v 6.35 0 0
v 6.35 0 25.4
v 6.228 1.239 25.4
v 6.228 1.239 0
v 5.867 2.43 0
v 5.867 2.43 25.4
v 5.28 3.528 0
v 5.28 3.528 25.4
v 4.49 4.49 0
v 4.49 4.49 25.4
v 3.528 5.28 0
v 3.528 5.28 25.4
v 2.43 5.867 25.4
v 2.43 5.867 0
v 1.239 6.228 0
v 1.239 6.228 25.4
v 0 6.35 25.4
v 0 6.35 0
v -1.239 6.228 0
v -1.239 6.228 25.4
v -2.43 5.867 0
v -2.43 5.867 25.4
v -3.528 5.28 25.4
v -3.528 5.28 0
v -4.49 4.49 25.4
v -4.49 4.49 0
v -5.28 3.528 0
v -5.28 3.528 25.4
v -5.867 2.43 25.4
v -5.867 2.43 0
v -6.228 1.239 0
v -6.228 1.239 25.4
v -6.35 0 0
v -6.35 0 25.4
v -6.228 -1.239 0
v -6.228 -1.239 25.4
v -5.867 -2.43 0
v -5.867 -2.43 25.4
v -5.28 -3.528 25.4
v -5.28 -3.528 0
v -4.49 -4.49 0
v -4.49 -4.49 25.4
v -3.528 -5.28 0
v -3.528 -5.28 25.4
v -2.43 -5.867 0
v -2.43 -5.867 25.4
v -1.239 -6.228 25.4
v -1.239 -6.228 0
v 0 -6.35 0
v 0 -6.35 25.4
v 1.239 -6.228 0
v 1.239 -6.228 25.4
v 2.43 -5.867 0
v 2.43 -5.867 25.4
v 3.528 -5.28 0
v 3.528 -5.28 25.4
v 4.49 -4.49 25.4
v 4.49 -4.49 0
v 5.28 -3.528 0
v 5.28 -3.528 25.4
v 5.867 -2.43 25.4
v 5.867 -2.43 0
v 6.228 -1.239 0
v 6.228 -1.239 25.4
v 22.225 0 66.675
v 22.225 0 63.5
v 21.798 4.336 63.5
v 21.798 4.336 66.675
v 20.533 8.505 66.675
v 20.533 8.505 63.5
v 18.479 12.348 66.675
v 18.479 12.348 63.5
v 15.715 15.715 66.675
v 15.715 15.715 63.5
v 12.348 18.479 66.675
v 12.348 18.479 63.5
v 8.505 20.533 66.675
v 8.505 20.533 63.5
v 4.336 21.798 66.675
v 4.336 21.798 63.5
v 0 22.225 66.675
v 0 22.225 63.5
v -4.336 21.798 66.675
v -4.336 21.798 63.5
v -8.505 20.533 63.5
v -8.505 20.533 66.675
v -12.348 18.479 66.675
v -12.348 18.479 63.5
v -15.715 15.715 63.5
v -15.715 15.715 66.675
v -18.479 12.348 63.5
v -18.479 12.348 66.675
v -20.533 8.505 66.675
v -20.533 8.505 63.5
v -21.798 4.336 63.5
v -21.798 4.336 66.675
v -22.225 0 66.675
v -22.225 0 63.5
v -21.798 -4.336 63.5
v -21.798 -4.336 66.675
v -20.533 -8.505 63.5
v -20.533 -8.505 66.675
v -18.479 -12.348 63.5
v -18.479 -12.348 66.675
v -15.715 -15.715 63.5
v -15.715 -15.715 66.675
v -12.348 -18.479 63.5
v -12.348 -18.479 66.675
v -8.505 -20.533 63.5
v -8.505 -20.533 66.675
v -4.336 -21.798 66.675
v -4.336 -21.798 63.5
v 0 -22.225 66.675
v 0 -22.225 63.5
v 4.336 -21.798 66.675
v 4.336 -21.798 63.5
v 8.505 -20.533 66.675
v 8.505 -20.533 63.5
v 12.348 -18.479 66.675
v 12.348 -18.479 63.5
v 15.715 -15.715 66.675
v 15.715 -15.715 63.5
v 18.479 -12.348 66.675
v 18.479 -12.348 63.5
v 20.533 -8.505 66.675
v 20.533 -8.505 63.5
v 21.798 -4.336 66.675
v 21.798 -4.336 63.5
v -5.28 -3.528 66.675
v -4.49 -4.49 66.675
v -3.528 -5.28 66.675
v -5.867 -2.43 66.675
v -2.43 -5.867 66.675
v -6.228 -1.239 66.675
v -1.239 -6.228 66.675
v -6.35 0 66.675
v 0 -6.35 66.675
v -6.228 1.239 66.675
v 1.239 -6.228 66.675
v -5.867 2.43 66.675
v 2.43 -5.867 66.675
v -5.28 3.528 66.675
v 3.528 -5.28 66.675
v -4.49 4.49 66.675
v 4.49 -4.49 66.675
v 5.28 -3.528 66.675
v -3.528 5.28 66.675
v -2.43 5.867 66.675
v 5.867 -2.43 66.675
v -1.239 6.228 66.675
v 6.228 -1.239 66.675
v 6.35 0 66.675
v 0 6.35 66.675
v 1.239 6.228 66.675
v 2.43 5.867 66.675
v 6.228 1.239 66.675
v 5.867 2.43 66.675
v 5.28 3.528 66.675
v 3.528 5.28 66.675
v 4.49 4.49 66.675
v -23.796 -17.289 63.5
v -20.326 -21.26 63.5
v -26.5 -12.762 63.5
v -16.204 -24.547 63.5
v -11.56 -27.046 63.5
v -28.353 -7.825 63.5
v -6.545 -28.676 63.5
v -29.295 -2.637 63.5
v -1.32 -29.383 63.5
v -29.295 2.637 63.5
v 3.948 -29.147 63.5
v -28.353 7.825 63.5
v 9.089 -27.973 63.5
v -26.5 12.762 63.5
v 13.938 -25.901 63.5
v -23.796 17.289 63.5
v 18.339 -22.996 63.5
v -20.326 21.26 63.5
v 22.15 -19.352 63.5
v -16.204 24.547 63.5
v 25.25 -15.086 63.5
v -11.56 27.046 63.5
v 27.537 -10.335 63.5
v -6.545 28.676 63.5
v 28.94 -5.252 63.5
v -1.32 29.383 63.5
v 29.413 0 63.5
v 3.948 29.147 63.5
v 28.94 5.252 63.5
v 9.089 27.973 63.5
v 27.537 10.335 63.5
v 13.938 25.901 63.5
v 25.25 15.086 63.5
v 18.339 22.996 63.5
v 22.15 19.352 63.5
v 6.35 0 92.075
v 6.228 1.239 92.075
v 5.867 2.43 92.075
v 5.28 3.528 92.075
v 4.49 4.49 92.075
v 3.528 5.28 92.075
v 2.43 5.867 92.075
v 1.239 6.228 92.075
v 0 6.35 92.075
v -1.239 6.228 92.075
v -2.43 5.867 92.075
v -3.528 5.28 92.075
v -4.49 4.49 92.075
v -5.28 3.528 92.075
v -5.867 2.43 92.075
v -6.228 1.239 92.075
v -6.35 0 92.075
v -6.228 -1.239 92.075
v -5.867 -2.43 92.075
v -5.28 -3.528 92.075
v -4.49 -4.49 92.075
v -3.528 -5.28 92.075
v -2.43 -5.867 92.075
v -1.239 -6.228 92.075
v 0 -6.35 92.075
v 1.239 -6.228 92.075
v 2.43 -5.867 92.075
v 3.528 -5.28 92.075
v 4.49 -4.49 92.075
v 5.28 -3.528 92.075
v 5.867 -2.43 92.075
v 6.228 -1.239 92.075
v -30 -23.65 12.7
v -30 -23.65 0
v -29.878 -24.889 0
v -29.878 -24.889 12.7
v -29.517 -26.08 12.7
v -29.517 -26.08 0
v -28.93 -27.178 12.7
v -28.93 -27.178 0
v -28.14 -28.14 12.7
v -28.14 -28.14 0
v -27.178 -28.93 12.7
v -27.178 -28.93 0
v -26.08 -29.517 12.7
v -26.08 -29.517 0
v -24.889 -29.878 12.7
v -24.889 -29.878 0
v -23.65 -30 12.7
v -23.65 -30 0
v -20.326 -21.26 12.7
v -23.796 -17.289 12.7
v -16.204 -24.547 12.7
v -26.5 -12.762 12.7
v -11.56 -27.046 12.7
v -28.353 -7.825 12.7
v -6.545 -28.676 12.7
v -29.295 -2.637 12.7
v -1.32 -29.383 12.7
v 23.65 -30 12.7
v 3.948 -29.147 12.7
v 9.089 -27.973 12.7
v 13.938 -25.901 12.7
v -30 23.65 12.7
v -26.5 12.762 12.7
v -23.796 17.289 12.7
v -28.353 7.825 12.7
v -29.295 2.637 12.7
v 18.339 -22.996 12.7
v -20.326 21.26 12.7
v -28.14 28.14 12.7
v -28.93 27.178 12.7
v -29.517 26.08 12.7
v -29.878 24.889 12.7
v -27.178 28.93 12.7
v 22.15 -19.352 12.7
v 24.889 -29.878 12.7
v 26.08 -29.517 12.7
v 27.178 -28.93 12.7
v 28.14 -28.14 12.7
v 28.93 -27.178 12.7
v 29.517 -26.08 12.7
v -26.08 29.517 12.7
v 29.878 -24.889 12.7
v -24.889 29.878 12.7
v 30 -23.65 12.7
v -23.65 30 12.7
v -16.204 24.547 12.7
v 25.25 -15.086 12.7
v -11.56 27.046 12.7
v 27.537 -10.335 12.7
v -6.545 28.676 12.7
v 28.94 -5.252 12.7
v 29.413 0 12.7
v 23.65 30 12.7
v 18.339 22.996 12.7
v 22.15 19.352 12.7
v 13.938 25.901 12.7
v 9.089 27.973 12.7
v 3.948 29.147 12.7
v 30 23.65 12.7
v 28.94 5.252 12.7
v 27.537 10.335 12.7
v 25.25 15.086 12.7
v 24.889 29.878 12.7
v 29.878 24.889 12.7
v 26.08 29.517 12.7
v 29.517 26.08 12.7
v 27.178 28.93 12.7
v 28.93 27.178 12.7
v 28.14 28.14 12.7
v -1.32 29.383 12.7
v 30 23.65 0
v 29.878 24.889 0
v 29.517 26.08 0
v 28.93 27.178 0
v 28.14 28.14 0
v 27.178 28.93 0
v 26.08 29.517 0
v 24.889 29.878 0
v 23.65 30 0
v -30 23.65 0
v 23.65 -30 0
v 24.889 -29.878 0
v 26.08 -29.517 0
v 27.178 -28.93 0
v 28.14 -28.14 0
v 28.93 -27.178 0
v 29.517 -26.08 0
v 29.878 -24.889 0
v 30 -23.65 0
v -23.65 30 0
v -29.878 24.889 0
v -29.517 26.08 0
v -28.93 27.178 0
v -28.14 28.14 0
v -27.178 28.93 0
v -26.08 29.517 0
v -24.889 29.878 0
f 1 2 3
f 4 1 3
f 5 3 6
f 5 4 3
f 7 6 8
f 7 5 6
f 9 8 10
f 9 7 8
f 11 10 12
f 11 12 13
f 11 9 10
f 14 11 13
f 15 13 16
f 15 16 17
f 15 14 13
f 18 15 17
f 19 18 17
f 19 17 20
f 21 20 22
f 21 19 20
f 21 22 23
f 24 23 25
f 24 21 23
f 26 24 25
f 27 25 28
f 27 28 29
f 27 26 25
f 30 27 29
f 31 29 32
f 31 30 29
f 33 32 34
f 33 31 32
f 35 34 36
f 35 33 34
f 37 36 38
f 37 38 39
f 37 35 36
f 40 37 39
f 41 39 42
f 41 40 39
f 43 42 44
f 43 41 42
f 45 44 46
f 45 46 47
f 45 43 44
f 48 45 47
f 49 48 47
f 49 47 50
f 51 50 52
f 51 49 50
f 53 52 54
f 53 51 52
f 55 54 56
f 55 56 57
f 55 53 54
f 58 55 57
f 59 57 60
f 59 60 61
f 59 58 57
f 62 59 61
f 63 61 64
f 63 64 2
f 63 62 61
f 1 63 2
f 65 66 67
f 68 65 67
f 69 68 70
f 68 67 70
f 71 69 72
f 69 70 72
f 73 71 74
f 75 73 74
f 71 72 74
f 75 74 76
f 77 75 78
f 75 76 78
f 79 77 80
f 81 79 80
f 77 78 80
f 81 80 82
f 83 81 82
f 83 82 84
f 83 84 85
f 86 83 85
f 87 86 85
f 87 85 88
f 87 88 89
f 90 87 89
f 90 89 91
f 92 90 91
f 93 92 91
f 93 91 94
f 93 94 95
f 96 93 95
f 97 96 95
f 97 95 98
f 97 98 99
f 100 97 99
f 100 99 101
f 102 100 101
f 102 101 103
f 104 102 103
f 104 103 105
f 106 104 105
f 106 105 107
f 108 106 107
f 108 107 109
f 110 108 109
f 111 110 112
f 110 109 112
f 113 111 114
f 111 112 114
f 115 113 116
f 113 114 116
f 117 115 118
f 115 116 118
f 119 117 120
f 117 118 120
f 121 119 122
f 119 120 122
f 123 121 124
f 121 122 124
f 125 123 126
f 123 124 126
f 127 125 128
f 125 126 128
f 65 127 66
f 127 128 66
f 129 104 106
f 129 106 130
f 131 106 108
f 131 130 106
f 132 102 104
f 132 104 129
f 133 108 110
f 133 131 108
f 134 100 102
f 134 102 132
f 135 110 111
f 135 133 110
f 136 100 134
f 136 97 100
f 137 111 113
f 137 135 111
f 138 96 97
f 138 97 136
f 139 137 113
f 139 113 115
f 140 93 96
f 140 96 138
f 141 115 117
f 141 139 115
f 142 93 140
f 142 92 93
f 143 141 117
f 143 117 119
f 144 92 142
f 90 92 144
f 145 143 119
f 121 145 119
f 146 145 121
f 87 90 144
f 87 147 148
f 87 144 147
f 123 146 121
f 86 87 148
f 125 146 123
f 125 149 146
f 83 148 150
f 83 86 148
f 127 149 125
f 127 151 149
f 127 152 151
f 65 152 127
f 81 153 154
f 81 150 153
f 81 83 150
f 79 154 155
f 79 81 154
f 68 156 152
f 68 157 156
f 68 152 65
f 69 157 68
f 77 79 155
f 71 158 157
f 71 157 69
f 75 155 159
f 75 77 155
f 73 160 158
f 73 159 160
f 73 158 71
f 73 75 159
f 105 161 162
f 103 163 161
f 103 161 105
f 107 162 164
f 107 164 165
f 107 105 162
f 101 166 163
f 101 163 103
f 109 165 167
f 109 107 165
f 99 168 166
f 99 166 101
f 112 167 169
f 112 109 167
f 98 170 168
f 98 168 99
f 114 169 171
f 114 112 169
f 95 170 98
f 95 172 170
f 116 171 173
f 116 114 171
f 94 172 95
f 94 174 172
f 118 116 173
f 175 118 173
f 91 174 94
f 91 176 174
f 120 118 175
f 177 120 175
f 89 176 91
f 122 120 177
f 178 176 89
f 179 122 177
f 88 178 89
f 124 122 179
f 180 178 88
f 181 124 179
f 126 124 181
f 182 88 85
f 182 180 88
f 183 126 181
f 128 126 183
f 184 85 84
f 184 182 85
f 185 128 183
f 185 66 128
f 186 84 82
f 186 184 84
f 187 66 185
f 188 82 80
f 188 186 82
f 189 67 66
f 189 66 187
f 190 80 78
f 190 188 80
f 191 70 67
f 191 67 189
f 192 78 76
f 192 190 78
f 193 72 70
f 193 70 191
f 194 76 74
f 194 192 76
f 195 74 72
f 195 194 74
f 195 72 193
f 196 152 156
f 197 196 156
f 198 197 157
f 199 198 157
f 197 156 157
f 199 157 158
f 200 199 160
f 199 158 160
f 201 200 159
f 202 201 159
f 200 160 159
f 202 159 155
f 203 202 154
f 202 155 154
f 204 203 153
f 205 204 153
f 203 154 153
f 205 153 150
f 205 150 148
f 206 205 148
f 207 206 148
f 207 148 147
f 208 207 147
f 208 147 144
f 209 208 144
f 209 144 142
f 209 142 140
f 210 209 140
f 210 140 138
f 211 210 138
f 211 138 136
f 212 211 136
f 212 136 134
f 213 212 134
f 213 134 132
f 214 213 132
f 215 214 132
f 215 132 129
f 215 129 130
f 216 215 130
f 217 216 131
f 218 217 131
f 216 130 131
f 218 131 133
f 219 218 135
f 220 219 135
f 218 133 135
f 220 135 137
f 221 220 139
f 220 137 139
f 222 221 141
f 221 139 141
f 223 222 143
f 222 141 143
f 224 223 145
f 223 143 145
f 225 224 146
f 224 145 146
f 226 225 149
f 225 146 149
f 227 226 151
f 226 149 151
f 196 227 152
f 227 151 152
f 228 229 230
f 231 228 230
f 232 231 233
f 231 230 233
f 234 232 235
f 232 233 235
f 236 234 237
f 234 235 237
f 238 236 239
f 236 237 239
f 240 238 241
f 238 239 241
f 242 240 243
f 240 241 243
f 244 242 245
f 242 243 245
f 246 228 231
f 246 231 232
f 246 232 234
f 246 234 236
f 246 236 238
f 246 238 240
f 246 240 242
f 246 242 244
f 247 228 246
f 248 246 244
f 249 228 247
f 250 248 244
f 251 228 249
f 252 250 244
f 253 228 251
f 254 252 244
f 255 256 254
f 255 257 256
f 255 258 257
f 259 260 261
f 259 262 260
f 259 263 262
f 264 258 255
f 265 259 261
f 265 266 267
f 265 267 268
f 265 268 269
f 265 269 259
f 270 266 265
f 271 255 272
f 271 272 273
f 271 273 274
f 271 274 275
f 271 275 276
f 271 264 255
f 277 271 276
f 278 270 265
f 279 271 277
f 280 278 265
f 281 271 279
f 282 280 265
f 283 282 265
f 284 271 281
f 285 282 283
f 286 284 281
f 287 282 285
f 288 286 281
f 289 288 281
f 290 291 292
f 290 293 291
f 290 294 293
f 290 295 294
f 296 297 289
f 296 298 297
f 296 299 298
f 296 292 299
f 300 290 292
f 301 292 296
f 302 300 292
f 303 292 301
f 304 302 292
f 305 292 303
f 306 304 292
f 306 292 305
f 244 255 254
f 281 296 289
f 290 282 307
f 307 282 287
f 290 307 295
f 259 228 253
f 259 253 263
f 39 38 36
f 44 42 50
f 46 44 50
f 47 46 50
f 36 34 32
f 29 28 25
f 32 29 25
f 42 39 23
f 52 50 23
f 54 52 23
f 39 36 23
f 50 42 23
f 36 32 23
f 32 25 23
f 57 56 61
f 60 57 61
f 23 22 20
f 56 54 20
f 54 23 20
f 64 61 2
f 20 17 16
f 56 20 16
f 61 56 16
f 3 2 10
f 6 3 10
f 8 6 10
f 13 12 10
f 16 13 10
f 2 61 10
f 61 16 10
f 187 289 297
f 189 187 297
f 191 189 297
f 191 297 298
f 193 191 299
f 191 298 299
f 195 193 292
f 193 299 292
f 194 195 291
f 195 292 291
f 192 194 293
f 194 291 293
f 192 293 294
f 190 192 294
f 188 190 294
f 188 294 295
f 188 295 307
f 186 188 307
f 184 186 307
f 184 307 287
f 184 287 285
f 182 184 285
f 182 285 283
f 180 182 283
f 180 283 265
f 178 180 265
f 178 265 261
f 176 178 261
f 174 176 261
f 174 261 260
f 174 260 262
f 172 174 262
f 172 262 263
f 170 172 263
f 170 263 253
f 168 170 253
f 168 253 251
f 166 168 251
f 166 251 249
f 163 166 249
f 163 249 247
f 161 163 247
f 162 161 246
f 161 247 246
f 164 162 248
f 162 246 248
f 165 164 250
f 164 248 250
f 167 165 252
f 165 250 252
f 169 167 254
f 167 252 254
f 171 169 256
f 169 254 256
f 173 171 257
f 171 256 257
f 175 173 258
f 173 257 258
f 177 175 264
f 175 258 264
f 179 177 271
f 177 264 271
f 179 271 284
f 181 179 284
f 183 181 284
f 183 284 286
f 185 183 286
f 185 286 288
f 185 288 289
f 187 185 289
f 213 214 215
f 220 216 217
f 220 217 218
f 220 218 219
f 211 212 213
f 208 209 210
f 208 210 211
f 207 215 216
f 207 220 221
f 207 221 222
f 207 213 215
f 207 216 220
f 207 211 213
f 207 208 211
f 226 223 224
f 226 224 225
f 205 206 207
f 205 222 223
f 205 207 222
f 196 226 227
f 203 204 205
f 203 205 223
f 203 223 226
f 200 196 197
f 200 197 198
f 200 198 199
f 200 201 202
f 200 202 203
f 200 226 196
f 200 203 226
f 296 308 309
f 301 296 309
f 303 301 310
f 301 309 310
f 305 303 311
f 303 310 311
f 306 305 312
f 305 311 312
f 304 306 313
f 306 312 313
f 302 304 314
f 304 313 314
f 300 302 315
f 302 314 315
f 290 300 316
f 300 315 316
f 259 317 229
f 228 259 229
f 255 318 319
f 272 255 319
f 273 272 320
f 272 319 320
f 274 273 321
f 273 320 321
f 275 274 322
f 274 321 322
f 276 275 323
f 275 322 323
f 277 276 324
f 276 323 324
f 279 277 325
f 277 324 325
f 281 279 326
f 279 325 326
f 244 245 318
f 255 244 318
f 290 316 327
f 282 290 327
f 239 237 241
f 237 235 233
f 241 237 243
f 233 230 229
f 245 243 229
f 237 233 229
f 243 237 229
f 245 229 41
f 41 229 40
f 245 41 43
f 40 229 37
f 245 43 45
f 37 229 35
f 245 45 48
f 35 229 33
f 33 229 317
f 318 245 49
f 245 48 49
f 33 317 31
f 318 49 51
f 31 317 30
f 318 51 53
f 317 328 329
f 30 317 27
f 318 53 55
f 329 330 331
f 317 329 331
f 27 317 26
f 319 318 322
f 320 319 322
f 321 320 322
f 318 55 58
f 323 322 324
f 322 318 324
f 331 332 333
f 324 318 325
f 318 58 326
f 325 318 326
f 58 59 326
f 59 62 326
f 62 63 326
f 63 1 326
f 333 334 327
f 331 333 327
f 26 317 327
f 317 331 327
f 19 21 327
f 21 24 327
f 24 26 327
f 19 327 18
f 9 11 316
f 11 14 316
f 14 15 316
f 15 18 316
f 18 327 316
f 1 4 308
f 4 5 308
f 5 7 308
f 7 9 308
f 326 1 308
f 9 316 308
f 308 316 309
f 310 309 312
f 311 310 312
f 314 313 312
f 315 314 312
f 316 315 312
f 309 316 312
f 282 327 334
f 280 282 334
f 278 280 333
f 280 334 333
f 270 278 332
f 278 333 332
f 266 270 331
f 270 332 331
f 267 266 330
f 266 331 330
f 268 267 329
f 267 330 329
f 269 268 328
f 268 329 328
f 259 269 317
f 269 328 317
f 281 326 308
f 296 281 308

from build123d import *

# Parameters (mm, degrees)
F0_R     = 29.412961
F1_DEPTH = 12.7
F0_R_2   = 22.225
F2_DEPTH = 63.5
F0_R_3   = 6.35
F3_DEPTH = 66.675
F4_DEPTH = 92.075
F5_DEPTH = 25.4


with BuildPart() as f1:
    # F0 (on Top) → F1 (new body)
    with BuildSketch(Plane.XY):
        with BuildLine():
            Line((-23.65, -30), (23.65, -30))
            ThreePointArc((23.65, -30), (28.140128, -28.140128), (30, -23.65))
            Line((30, -23.65), (30, 23.65))
            ThreePointArc((30, 23.65), (28.140128, 28.140128), (23.65, 30))
            Line((23.65, 30), (-23.65, 30))
            ThreePointArc((-23.65, 30), (-28.140128, 28.140128), (-30, 23.65))
            Line((-30, 23.65), (-30, -23.65))
            ThreePointArc((-30, -23.65), (-28.140128, -28.140128), (-23.65, -30))
        make_face()
        Circle(F0_R, mode=Mode.SUBTRACT)
    extrude(amount=F1_DEPTH)

    # F0 (on Top) → F2 (join)
    with BuildSketch(Plane.XY):
        Circle(F0_R)
        Circle(F0_R_2, mode=Mode.SUBTRACT)
    extrude(amount=F2_DEPTH)

    # F0 (on Top) → F3 (join)
    with BuildSketch(Plane.XY):
        Circle(F0_R_2)
        Circle(F0_R_3, mode=Mode.SUBTRACT)
    extrude(amount=F3_DEPTH)

    # F0 (on Top) → F4 (join)
    with BuildSketch(Plane.XY):
        Circle(F0_R_3)
    extrude(amount=F4_DEPTH)

    # F0 (on Top) → F5 (cut)
    with BuildSketch(Plane.XY):
        Circle(F0_R_3)
    extrude(amount=F5_DEPTH, mode=Mode.SUBTRACT)


solid = f1.part
